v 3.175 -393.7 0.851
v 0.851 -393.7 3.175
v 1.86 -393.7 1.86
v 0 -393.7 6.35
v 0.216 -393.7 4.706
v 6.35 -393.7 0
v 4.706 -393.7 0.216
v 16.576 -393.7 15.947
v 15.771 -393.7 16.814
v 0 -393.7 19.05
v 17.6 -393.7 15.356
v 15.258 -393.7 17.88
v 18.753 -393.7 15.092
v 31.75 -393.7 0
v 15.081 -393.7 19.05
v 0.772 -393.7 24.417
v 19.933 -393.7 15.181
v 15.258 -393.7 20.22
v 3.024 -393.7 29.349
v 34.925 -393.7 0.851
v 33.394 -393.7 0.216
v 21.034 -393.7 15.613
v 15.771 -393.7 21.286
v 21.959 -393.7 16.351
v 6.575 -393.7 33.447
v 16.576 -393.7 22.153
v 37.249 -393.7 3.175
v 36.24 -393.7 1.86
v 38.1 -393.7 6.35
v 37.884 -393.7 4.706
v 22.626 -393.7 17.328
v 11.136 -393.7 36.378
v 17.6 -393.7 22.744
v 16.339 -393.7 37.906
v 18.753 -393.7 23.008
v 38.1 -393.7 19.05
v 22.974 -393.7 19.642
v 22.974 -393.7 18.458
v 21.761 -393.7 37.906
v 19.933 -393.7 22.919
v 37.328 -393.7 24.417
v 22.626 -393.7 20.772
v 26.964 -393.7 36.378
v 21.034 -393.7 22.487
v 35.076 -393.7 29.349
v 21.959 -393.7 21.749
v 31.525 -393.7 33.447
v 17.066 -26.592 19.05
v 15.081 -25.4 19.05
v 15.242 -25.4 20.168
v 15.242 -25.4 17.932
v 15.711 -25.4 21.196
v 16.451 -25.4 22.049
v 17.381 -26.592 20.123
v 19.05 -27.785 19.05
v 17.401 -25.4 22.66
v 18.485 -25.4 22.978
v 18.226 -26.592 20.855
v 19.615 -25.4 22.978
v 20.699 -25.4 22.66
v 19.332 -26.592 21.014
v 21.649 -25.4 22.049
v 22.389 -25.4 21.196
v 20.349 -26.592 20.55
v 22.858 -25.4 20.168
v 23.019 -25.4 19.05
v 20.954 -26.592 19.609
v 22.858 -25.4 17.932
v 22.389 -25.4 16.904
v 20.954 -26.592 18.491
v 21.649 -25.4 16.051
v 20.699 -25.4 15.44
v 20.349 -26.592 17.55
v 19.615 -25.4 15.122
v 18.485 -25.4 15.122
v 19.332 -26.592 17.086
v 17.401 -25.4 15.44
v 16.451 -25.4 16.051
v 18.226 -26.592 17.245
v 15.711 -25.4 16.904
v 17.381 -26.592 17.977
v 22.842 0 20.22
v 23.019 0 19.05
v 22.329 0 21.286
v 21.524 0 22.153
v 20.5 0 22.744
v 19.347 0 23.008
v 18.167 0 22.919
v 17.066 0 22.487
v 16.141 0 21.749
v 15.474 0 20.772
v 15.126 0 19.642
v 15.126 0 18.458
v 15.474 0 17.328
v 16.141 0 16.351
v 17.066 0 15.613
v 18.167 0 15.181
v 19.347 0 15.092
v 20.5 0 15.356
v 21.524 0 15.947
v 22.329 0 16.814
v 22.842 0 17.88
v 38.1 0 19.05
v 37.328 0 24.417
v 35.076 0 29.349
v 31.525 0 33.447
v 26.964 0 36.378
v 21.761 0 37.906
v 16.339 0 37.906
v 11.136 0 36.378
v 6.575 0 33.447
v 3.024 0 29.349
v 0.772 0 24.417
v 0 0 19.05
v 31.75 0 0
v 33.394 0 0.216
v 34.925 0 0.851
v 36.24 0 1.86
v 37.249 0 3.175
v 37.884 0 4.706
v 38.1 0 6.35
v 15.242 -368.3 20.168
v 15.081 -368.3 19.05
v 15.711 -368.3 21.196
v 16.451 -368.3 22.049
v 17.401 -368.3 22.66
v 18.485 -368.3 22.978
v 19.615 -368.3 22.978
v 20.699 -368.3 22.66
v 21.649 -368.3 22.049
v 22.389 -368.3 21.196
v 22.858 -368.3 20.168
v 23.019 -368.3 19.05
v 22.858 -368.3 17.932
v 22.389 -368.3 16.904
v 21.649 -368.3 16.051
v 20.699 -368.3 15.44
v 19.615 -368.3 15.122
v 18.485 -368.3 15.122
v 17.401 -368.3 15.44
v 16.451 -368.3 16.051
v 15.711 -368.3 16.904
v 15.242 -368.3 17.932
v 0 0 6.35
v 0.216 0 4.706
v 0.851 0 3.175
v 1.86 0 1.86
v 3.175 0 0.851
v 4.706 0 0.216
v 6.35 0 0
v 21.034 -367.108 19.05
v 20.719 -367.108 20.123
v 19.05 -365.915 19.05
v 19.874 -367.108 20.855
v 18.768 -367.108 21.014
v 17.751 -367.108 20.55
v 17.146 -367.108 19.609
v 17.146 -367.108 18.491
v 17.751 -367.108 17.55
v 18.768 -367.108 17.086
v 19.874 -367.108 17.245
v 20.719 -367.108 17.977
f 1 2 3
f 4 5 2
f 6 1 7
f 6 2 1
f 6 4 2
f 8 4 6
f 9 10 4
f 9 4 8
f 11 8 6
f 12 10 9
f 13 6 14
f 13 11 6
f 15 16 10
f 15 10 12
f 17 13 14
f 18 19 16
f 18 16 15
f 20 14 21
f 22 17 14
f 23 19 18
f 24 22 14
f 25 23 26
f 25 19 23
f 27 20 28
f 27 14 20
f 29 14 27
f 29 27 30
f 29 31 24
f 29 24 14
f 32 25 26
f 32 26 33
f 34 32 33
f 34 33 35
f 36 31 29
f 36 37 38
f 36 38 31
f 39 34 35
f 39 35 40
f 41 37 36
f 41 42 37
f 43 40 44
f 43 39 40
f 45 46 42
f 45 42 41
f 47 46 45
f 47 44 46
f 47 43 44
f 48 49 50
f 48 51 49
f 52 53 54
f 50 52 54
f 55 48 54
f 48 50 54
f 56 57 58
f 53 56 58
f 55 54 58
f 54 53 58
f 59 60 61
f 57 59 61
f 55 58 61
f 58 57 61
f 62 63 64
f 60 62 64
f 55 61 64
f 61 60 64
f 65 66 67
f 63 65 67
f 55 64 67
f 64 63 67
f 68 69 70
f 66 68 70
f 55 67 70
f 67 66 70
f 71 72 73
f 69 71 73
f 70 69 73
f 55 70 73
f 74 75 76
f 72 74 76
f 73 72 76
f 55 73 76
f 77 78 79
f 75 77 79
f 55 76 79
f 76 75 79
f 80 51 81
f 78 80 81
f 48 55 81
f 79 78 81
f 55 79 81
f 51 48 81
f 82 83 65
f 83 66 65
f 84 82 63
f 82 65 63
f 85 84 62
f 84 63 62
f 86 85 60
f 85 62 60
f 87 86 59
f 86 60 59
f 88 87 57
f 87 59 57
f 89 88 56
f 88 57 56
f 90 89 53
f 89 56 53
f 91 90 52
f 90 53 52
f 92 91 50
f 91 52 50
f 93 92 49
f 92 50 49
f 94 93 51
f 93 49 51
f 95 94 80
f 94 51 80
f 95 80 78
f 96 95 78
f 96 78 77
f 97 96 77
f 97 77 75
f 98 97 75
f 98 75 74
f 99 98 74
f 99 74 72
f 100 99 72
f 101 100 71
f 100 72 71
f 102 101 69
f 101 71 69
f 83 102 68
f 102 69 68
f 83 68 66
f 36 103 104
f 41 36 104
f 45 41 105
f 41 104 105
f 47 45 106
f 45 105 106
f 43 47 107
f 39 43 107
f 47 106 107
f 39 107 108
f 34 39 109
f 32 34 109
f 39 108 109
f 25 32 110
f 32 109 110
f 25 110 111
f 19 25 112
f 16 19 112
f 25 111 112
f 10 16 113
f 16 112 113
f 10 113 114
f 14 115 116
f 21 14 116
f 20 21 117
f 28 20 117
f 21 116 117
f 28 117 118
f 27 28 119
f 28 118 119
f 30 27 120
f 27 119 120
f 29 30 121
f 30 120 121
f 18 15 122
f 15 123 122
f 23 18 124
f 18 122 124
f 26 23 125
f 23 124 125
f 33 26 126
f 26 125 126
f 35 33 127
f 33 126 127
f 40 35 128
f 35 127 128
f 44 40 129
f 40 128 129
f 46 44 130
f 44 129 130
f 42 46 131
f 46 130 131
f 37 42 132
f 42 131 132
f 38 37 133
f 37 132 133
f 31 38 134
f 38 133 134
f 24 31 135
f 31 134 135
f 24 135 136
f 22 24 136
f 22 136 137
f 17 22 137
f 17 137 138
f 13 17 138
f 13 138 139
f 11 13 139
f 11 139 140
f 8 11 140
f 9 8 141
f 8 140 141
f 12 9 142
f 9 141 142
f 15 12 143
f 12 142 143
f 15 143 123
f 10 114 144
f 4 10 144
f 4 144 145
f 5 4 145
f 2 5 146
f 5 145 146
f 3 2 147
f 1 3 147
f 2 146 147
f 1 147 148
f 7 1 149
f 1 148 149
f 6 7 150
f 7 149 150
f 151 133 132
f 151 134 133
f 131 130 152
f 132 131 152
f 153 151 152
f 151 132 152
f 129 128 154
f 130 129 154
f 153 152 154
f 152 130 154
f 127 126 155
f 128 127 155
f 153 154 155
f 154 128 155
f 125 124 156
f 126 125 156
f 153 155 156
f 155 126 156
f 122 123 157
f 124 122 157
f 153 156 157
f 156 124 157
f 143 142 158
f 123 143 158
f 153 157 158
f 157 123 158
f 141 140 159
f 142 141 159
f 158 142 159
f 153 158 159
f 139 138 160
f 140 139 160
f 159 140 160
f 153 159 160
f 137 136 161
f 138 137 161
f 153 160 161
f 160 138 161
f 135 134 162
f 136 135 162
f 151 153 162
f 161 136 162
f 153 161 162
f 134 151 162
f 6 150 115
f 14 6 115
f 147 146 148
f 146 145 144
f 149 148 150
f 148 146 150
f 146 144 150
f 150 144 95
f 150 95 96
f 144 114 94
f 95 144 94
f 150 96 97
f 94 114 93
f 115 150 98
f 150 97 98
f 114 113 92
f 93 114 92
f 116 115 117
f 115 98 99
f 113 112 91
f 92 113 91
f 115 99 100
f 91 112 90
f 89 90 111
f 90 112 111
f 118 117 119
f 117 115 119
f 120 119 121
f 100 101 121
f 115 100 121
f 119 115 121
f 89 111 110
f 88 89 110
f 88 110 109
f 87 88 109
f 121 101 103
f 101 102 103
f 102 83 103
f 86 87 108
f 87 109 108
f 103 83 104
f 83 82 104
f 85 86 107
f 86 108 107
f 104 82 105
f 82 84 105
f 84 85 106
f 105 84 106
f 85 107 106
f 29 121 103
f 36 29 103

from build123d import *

# Parameters (mm, degrees)
F1_DEPTH       = 393.7
F4_D           = 7.9375
F4_DEPTH       = 25.4
F4_TIP         = 2.3846655818
F4_ON_F3_D     = 7.9375
F4_ON_F3_DEPTH = 25.4
F4_ON_F3_TIP   = 2.3846655818


with BuildPart() as f1:
    # F0 (on Front) → F1 (new body)
    with BuildSketch(Plane.XZ):
        with BuildLine():
            ThreePointArc((0, 6.35), (1.8598719395, 1.8598719395), (6.35, 0))
            Line((6.35, 0), (31.75, 0))
            ThreePointArc((31.75, 0), (36.2401280605, 1.8598719395), (38.1, 6.35))
            Line((38.1, 6.35), (38.1, 19.05))
            ThreePointArc((38.1, 19.05), (19.05, 38.1), (0, 19.05))
            Line((0, 19.05), (0, 6.35))
        make_face()
    extrude(amount=F1_DEPTH)

    # F4
    with Locations(Plane.XZ.offset(393.7)):
        with Locations((19.05, 19.05)):
            Hole(F4_D / 2, depth=F4_DEPTH)
            with Locations((0, 0, -(F4_DEPTH + F4_TIP / 2))):  # 118° drill point
                Cone(0, F4_D / 2, F4_TIP, mode=Mode.SUBTRACT)

    # F4 on F3
    with Locations(Plane(origin=(0, 0, 0), x_dir=(-1, 0, 0), z_dir=(0, 1, 0))):
        with Locations((-19.05, 19.05)):
            Hole(F4_ON_F3_D / 2, depth=F4_ON_F3_DEPTH)
            with Locations((0, 0, -(F4_ON_F3_DEPTH + F4_ON_F3_TIP / 2))):  # 118° drill point
                Cone(0, F4_ON_F3_D / 2, F4_ON_F3_TIP, mode=Mode.SUBTRACT)


solid = f1.part
